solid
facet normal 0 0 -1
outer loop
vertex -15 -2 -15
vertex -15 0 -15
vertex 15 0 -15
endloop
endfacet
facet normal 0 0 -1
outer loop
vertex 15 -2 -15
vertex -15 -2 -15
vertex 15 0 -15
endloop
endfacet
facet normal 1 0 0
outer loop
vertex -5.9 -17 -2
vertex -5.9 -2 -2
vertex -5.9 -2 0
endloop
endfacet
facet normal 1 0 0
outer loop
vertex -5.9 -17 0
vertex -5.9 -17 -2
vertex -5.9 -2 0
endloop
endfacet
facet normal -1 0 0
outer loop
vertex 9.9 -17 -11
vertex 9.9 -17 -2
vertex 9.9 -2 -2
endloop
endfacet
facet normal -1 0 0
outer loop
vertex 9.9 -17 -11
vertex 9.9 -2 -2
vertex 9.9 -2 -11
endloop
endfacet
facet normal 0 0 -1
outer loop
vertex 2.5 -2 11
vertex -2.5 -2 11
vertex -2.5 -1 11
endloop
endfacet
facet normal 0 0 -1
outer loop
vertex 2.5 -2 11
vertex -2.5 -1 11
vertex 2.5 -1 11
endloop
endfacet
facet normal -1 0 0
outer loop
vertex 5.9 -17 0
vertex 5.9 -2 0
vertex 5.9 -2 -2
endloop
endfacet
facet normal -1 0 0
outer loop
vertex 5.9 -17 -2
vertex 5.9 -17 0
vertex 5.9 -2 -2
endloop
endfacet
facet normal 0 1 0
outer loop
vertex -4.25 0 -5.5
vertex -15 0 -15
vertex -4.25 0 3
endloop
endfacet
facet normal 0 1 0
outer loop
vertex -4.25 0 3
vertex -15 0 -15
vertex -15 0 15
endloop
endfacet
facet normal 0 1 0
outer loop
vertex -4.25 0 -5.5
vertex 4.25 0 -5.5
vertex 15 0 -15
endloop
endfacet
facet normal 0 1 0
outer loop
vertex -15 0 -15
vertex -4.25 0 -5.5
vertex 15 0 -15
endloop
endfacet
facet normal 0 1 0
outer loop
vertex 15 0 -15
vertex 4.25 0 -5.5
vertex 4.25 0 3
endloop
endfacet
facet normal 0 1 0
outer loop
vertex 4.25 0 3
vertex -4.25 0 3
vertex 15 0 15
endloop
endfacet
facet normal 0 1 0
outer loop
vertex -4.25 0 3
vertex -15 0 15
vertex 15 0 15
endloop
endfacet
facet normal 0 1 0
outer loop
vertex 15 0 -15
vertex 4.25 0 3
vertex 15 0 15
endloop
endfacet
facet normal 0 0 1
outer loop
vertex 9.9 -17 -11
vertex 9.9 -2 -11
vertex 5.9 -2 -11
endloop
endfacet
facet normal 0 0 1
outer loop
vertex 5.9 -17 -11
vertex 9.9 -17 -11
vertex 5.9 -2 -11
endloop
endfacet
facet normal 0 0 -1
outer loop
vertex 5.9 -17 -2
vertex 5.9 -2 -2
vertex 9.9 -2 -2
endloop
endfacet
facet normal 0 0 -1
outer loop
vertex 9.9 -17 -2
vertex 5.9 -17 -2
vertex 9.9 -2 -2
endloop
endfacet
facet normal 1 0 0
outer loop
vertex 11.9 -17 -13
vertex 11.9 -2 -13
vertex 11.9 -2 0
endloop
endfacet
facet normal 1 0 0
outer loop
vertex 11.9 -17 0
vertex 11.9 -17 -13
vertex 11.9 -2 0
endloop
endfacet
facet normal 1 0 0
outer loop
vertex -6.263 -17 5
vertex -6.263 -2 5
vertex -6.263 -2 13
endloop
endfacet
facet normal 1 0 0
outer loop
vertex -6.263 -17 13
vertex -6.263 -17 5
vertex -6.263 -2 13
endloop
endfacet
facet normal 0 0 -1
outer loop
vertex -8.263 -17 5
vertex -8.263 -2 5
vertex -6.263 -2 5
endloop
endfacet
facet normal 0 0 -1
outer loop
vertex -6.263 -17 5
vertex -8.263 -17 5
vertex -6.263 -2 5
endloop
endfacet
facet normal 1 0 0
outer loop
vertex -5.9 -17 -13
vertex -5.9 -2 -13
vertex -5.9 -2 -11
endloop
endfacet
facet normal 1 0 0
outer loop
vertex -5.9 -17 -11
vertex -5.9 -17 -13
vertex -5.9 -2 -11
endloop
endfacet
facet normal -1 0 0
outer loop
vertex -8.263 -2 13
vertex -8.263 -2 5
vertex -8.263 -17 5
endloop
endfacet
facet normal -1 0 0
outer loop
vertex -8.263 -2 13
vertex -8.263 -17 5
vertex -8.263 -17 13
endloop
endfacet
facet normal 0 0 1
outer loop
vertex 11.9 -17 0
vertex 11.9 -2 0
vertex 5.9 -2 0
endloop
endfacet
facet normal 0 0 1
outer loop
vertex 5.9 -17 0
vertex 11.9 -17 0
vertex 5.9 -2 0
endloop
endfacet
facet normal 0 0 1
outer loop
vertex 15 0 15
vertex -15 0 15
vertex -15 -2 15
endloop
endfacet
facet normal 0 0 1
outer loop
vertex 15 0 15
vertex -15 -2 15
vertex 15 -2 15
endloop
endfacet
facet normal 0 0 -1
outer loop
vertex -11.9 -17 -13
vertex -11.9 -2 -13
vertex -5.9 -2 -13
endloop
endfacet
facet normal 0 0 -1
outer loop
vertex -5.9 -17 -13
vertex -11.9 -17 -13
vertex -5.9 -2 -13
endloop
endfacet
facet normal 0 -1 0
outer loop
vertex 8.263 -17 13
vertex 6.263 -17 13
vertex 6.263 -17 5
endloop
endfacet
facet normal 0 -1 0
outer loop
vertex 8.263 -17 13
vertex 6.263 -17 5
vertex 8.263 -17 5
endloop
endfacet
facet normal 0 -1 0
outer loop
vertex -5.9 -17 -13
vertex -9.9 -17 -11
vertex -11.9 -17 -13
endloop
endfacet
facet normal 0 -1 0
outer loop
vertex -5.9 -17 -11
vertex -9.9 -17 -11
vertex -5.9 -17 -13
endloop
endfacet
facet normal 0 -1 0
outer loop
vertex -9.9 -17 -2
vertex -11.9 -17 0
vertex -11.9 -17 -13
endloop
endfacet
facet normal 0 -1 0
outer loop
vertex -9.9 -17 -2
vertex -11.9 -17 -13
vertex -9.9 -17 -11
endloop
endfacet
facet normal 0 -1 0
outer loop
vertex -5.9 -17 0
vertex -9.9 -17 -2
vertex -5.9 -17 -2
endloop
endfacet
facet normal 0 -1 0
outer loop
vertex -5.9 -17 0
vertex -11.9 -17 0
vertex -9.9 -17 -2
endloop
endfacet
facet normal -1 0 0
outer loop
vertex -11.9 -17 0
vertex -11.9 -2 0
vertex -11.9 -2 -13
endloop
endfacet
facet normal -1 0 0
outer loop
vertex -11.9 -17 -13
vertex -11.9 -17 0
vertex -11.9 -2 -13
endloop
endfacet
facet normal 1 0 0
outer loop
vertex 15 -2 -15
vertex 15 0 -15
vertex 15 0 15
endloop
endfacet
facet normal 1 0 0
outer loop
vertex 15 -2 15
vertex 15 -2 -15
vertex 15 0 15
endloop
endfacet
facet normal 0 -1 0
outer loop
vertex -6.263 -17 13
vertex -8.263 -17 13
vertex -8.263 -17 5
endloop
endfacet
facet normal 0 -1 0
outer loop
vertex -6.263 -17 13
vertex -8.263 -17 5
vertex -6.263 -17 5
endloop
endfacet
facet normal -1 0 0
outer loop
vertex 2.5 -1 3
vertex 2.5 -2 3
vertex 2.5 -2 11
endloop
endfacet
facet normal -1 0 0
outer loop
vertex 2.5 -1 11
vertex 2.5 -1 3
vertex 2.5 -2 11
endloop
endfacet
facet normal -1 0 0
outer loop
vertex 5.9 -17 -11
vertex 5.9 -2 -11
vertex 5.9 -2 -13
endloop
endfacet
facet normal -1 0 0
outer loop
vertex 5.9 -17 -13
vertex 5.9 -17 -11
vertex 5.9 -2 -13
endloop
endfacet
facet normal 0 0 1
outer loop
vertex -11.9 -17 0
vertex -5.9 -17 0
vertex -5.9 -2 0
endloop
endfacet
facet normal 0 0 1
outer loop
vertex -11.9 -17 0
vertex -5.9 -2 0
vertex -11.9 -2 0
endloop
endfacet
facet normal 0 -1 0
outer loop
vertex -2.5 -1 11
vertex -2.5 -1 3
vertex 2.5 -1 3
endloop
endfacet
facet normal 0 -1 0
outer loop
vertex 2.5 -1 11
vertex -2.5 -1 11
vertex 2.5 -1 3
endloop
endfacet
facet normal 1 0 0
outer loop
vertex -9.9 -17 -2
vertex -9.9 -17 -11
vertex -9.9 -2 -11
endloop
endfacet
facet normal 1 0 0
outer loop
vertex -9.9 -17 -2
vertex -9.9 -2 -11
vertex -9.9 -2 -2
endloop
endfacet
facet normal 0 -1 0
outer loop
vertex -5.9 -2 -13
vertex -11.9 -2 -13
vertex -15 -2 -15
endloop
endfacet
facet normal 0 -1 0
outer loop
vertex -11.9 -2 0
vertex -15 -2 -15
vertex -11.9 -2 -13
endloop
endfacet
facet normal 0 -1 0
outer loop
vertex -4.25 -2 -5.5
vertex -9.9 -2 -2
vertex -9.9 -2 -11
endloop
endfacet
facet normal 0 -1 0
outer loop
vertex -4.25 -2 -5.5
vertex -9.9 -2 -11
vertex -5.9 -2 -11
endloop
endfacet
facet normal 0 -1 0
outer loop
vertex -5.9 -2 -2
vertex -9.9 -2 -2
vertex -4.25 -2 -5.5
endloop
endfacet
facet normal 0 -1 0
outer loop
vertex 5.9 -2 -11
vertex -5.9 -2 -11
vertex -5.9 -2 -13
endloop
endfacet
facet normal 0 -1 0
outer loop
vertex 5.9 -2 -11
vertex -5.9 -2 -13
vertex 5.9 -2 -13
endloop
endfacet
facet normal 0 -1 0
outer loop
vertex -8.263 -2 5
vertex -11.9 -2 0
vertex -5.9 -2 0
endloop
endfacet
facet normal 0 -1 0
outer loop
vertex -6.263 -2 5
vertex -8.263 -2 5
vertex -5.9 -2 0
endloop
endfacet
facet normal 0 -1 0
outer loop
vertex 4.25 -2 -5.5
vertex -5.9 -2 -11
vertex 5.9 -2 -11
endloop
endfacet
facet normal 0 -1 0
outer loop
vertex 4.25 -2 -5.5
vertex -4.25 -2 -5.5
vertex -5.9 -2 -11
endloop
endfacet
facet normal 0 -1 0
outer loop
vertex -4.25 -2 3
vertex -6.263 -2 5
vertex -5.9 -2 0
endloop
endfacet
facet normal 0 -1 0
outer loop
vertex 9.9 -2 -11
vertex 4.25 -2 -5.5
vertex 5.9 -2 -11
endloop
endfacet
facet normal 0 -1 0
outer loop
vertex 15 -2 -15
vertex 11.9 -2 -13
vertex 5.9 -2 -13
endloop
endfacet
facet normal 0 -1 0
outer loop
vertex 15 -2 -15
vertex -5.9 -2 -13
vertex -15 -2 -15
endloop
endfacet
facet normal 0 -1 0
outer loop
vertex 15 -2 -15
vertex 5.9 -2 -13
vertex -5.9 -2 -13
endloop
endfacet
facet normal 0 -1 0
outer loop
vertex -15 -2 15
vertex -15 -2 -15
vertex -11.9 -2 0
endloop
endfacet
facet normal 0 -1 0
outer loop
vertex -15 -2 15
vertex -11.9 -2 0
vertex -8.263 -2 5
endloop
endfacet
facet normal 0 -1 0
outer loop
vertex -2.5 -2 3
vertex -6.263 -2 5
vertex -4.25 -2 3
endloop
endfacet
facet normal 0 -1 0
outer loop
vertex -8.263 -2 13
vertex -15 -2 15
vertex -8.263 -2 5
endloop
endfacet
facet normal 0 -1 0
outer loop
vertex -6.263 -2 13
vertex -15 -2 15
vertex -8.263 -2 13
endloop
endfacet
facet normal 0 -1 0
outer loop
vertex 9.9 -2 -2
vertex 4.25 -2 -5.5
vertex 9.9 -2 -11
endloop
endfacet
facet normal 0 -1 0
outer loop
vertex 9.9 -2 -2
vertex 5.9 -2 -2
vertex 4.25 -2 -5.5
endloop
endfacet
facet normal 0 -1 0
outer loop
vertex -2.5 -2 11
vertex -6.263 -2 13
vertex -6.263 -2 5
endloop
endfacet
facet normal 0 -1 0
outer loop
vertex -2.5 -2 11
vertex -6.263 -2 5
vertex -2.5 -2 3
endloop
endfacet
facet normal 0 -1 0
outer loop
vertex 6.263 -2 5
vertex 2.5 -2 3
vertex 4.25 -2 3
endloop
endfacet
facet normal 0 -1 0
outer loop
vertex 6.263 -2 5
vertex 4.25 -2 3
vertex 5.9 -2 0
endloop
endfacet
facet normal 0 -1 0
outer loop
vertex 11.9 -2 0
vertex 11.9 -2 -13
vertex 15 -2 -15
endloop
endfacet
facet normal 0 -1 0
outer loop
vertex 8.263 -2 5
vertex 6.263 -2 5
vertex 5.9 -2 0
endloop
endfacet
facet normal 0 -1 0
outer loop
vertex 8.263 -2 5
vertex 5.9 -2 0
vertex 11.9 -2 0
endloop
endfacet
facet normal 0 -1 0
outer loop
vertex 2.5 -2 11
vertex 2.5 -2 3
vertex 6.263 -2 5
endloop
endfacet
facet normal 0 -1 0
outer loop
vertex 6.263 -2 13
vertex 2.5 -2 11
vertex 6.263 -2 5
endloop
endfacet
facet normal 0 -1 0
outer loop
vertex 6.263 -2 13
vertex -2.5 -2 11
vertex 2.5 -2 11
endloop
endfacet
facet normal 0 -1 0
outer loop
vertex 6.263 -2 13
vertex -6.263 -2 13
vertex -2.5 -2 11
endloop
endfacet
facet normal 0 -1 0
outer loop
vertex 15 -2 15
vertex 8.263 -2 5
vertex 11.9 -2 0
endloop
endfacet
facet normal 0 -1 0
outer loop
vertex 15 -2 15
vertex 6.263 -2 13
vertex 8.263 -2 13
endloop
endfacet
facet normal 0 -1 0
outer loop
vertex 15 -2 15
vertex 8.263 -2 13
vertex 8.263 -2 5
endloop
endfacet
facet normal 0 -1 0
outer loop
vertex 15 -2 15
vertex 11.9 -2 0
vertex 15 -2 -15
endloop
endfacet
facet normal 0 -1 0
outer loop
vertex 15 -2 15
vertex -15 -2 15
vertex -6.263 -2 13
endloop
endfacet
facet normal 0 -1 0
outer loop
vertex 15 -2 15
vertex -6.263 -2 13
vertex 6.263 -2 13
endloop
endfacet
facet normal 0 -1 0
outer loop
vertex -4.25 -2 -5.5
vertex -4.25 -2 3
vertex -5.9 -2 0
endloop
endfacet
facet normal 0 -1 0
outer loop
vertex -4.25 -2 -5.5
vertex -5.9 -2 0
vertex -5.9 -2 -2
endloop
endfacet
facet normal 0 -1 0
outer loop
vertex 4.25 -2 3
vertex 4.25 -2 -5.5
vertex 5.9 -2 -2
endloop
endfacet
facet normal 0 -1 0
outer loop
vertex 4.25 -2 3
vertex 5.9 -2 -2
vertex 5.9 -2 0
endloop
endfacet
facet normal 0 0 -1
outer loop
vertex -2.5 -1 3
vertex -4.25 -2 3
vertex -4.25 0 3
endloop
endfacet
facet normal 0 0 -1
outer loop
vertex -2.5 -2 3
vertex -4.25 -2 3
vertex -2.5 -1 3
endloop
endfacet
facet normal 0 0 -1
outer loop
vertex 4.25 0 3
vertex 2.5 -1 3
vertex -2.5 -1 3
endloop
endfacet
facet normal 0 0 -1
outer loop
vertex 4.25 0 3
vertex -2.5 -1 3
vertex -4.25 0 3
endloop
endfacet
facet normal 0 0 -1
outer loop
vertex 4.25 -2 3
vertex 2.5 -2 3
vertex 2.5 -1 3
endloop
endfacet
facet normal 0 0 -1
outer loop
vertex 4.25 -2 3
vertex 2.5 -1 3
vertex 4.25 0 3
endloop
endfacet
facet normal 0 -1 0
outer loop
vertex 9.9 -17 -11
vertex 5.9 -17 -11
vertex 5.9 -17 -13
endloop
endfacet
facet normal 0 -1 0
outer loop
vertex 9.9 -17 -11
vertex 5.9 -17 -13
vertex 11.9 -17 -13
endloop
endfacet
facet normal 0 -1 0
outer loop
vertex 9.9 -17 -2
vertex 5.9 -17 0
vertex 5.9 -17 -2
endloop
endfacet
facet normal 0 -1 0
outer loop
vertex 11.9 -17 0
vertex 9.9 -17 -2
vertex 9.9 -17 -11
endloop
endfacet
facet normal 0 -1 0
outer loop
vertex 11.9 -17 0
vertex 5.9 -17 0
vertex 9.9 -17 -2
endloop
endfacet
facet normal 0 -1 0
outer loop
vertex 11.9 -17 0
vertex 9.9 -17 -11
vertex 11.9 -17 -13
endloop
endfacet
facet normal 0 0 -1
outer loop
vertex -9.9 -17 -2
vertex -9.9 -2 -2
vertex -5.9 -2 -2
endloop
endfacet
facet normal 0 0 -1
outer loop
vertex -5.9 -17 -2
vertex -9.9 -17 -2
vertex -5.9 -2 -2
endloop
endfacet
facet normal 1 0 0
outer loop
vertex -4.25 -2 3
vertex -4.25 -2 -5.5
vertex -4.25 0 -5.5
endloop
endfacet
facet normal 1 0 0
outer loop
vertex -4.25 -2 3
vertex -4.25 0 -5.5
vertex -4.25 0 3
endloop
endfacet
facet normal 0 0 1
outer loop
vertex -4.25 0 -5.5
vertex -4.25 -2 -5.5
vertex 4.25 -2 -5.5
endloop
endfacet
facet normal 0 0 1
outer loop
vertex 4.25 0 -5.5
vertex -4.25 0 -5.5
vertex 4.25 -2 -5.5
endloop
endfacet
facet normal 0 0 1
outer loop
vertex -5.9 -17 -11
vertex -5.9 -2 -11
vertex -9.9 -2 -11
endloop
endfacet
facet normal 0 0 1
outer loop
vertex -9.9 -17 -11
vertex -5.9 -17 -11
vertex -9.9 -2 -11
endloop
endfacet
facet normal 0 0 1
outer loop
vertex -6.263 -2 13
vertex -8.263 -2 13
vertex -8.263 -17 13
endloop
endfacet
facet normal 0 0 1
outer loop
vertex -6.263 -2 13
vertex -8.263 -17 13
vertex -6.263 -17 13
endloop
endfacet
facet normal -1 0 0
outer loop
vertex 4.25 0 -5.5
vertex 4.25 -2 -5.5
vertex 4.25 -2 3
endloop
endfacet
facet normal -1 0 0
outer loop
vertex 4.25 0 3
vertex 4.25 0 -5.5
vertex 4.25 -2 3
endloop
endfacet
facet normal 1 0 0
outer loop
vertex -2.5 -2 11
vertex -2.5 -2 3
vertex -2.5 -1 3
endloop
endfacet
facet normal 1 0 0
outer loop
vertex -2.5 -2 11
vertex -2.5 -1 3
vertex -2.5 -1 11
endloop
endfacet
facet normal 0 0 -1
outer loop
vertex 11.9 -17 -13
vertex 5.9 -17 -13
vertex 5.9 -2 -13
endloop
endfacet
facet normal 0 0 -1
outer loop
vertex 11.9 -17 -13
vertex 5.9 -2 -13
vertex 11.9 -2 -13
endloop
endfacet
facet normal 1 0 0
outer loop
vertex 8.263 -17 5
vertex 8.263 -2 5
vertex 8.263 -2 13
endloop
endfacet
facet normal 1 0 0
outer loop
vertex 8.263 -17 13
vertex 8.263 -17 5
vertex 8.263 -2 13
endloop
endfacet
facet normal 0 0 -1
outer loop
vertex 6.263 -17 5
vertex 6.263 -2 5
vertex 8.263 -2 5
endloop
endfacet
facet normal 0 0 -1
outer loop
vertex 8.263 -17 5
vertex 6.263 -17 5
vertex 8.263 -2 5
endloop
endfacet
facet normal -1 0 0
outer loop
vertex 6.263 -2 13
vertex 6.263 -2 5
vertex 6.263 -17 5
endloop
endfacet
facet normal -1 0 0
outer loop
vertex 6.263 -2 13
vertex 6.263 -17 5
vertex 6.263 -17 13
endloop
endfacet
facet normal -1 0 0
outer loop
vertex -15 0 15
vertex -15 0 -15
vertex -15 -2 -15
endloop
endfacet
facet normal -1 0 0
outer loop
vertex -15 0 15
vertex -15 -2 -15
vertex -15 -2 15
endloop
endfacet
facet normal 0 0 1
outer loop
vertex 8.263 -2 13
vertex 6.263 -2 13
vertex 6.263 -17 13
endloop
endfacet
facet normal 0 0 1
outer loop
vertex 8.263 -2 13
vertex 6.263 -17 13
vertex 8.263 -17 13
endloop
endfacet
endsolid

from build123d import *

# Parameters (mm, degrees)
F0_W     = 30
F0_H     = 30
F1_DEPTH = 2
F3_DEPTH = 15
F4_W     = 8.5
F4_H     = 8.5
F5_DEPTH = 25
F6_W     = 2
F6_H     = 8
F7_DEPTH = 15
F8_W     = 5
F8_H     = 8
F9_DEPTH = 1


with BuildPart() as f1:
    # F0 (on Front) → F1 (new body)
    with BuildSketch(Plane.XZ):
        Rectangle(F0_W, F0_H)
    extrude(amount=F1_DEPTH)

    # F2 (on face) → F3 (join)
    with BuildSketch(Plane.XZ.offset(2)):
        Polygon((5.9, -11), (5.9, -13), (11.9, -13), (11.9, 0), (5.9, 0), (5.9, -2), (9.9, -2), (9.9, -11), align=None)
        Polygon((-9.9, -2), (-5.9, -2), (-5.9, 0), (-11.9, 0), (-11.9, -13), (-5.9, -13), (-5.9, -11), (-9.9, -11), align=None)
    extrude(amount=F3_DEPTH)

    # F4 (on face) → F5 (cut)
    with BuildSketch(Plane.XZ.offset(2)):
        with Locations((0, -1.25)):
            Rectangle(F4_W, F4_H)
    extrude(amount=-F5_DEPTH, mode=Mode.SUBTRACT)

    # F6 (on face) → F7 (join)
    with BuildSketch(Plane.XZ.offset(2)):
        with Locations((-7.263201, 9)):
            Rectangle(F6_W, F6_H)
        with Locations((7.263201, 9)):
            Rectangle(F6_W, F6_H)
    extrude(amount=F7_DEPTH)

    # F8 (on face) → F9 (cut)
    with BuildSketch(Plane.XZ.offset(2)):
        with Locations((0, 7)):
            Rectangle(F8_W, F8_H)
    extrude(amount=-F9_DEPTH, mode=Mode.SUBTRACT)


solid = f1.part
